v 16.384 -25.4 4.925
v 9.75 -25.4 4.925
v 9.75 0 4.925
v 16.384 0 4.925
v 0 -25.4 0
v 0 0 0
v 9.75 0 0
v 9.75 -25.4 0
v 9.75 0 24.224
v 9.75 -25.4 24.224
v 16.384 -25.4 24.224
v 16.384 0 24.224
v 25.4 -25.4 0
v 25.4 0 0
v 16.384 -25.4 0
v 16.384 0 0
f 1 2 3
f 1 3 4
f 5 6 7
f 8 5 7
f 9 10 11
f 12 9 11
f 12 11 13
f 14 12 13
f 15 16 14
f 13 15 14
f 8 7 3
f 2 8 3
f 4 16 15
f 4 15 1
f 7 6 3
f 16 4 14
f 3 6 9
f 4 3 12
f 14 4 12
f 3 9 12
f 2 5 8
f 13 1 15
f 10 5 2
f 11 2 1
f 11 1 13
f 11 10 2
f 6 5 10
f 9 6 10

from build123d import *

# Parameters (mm, degrees)
F0_W     = 25.4
F0_H     = 31.75
F1_DEPTH = 25.4
F2_W     = 6.633994
F2_H     = 4.925239
F3_DEPTH = 25.401
F5_DEPTH = 25.401
F6_DEPTH = 25.401
F7_DEPTH = 25.401


with BuildPart() as f1:
    # F0 (on Front) → F1 (new body)
    with BuildSketch(Plane.XZ):
        with Locations((12.7, 15.875)):
            Rectangle(F0_W, F0_H)
    extrude(amount=F1_DEPTH)

    # F2 (on face) → F3 (cut, through all)
    with BuildSketch(Plane.XZ.offset(25.4)):
        with Locations((13.06696, 2.462619)):
            Rectangle(F2_W, F2_H)
    extrude(amount=-F3_DEPTH, mode=Mode.SUBTRACT)

    # F4 (on face) → F5 (cut, through all)
    with BuildSketch(Plane.XZ.offset(25.4)):
        Polygon((25.4, 31.75), (0, 31.75), (0, 0), (9.749963, 24.224134), (16.383957, 24.224134), (25.4, 0), align=None)
    extrude(amount=-F5_DEPTH, mode=Mode.SUBTRACT)

    # F2 (on face) → F6 (cut, through all)
    with BuildSketch(Plane.XZ.offset(25.4)):
        Polygon((0, 31.75), (0, 0), (9.749963, 24.224134), (16.383957, 24.224134), (25.4, 0), (25.4, 31.75), align=None)
    extrude(amount=-F6_DEPTH, mode=Mode.SUBTRACT)

    # F2 (on face) → F7 (cut, through all)
    with BuildSketch(Plane.XZ.offset(25.4)):
        Polygon((0, 31.75), (0, 0), (9.749963, 24.224134), (16.383957, 24.224134), (25.4, 0), (25.4, 31.75), align=None)
    extrude(amount=-F7_DEPTH, mode=Mode.SUBTRACT)


solid = f1.part
